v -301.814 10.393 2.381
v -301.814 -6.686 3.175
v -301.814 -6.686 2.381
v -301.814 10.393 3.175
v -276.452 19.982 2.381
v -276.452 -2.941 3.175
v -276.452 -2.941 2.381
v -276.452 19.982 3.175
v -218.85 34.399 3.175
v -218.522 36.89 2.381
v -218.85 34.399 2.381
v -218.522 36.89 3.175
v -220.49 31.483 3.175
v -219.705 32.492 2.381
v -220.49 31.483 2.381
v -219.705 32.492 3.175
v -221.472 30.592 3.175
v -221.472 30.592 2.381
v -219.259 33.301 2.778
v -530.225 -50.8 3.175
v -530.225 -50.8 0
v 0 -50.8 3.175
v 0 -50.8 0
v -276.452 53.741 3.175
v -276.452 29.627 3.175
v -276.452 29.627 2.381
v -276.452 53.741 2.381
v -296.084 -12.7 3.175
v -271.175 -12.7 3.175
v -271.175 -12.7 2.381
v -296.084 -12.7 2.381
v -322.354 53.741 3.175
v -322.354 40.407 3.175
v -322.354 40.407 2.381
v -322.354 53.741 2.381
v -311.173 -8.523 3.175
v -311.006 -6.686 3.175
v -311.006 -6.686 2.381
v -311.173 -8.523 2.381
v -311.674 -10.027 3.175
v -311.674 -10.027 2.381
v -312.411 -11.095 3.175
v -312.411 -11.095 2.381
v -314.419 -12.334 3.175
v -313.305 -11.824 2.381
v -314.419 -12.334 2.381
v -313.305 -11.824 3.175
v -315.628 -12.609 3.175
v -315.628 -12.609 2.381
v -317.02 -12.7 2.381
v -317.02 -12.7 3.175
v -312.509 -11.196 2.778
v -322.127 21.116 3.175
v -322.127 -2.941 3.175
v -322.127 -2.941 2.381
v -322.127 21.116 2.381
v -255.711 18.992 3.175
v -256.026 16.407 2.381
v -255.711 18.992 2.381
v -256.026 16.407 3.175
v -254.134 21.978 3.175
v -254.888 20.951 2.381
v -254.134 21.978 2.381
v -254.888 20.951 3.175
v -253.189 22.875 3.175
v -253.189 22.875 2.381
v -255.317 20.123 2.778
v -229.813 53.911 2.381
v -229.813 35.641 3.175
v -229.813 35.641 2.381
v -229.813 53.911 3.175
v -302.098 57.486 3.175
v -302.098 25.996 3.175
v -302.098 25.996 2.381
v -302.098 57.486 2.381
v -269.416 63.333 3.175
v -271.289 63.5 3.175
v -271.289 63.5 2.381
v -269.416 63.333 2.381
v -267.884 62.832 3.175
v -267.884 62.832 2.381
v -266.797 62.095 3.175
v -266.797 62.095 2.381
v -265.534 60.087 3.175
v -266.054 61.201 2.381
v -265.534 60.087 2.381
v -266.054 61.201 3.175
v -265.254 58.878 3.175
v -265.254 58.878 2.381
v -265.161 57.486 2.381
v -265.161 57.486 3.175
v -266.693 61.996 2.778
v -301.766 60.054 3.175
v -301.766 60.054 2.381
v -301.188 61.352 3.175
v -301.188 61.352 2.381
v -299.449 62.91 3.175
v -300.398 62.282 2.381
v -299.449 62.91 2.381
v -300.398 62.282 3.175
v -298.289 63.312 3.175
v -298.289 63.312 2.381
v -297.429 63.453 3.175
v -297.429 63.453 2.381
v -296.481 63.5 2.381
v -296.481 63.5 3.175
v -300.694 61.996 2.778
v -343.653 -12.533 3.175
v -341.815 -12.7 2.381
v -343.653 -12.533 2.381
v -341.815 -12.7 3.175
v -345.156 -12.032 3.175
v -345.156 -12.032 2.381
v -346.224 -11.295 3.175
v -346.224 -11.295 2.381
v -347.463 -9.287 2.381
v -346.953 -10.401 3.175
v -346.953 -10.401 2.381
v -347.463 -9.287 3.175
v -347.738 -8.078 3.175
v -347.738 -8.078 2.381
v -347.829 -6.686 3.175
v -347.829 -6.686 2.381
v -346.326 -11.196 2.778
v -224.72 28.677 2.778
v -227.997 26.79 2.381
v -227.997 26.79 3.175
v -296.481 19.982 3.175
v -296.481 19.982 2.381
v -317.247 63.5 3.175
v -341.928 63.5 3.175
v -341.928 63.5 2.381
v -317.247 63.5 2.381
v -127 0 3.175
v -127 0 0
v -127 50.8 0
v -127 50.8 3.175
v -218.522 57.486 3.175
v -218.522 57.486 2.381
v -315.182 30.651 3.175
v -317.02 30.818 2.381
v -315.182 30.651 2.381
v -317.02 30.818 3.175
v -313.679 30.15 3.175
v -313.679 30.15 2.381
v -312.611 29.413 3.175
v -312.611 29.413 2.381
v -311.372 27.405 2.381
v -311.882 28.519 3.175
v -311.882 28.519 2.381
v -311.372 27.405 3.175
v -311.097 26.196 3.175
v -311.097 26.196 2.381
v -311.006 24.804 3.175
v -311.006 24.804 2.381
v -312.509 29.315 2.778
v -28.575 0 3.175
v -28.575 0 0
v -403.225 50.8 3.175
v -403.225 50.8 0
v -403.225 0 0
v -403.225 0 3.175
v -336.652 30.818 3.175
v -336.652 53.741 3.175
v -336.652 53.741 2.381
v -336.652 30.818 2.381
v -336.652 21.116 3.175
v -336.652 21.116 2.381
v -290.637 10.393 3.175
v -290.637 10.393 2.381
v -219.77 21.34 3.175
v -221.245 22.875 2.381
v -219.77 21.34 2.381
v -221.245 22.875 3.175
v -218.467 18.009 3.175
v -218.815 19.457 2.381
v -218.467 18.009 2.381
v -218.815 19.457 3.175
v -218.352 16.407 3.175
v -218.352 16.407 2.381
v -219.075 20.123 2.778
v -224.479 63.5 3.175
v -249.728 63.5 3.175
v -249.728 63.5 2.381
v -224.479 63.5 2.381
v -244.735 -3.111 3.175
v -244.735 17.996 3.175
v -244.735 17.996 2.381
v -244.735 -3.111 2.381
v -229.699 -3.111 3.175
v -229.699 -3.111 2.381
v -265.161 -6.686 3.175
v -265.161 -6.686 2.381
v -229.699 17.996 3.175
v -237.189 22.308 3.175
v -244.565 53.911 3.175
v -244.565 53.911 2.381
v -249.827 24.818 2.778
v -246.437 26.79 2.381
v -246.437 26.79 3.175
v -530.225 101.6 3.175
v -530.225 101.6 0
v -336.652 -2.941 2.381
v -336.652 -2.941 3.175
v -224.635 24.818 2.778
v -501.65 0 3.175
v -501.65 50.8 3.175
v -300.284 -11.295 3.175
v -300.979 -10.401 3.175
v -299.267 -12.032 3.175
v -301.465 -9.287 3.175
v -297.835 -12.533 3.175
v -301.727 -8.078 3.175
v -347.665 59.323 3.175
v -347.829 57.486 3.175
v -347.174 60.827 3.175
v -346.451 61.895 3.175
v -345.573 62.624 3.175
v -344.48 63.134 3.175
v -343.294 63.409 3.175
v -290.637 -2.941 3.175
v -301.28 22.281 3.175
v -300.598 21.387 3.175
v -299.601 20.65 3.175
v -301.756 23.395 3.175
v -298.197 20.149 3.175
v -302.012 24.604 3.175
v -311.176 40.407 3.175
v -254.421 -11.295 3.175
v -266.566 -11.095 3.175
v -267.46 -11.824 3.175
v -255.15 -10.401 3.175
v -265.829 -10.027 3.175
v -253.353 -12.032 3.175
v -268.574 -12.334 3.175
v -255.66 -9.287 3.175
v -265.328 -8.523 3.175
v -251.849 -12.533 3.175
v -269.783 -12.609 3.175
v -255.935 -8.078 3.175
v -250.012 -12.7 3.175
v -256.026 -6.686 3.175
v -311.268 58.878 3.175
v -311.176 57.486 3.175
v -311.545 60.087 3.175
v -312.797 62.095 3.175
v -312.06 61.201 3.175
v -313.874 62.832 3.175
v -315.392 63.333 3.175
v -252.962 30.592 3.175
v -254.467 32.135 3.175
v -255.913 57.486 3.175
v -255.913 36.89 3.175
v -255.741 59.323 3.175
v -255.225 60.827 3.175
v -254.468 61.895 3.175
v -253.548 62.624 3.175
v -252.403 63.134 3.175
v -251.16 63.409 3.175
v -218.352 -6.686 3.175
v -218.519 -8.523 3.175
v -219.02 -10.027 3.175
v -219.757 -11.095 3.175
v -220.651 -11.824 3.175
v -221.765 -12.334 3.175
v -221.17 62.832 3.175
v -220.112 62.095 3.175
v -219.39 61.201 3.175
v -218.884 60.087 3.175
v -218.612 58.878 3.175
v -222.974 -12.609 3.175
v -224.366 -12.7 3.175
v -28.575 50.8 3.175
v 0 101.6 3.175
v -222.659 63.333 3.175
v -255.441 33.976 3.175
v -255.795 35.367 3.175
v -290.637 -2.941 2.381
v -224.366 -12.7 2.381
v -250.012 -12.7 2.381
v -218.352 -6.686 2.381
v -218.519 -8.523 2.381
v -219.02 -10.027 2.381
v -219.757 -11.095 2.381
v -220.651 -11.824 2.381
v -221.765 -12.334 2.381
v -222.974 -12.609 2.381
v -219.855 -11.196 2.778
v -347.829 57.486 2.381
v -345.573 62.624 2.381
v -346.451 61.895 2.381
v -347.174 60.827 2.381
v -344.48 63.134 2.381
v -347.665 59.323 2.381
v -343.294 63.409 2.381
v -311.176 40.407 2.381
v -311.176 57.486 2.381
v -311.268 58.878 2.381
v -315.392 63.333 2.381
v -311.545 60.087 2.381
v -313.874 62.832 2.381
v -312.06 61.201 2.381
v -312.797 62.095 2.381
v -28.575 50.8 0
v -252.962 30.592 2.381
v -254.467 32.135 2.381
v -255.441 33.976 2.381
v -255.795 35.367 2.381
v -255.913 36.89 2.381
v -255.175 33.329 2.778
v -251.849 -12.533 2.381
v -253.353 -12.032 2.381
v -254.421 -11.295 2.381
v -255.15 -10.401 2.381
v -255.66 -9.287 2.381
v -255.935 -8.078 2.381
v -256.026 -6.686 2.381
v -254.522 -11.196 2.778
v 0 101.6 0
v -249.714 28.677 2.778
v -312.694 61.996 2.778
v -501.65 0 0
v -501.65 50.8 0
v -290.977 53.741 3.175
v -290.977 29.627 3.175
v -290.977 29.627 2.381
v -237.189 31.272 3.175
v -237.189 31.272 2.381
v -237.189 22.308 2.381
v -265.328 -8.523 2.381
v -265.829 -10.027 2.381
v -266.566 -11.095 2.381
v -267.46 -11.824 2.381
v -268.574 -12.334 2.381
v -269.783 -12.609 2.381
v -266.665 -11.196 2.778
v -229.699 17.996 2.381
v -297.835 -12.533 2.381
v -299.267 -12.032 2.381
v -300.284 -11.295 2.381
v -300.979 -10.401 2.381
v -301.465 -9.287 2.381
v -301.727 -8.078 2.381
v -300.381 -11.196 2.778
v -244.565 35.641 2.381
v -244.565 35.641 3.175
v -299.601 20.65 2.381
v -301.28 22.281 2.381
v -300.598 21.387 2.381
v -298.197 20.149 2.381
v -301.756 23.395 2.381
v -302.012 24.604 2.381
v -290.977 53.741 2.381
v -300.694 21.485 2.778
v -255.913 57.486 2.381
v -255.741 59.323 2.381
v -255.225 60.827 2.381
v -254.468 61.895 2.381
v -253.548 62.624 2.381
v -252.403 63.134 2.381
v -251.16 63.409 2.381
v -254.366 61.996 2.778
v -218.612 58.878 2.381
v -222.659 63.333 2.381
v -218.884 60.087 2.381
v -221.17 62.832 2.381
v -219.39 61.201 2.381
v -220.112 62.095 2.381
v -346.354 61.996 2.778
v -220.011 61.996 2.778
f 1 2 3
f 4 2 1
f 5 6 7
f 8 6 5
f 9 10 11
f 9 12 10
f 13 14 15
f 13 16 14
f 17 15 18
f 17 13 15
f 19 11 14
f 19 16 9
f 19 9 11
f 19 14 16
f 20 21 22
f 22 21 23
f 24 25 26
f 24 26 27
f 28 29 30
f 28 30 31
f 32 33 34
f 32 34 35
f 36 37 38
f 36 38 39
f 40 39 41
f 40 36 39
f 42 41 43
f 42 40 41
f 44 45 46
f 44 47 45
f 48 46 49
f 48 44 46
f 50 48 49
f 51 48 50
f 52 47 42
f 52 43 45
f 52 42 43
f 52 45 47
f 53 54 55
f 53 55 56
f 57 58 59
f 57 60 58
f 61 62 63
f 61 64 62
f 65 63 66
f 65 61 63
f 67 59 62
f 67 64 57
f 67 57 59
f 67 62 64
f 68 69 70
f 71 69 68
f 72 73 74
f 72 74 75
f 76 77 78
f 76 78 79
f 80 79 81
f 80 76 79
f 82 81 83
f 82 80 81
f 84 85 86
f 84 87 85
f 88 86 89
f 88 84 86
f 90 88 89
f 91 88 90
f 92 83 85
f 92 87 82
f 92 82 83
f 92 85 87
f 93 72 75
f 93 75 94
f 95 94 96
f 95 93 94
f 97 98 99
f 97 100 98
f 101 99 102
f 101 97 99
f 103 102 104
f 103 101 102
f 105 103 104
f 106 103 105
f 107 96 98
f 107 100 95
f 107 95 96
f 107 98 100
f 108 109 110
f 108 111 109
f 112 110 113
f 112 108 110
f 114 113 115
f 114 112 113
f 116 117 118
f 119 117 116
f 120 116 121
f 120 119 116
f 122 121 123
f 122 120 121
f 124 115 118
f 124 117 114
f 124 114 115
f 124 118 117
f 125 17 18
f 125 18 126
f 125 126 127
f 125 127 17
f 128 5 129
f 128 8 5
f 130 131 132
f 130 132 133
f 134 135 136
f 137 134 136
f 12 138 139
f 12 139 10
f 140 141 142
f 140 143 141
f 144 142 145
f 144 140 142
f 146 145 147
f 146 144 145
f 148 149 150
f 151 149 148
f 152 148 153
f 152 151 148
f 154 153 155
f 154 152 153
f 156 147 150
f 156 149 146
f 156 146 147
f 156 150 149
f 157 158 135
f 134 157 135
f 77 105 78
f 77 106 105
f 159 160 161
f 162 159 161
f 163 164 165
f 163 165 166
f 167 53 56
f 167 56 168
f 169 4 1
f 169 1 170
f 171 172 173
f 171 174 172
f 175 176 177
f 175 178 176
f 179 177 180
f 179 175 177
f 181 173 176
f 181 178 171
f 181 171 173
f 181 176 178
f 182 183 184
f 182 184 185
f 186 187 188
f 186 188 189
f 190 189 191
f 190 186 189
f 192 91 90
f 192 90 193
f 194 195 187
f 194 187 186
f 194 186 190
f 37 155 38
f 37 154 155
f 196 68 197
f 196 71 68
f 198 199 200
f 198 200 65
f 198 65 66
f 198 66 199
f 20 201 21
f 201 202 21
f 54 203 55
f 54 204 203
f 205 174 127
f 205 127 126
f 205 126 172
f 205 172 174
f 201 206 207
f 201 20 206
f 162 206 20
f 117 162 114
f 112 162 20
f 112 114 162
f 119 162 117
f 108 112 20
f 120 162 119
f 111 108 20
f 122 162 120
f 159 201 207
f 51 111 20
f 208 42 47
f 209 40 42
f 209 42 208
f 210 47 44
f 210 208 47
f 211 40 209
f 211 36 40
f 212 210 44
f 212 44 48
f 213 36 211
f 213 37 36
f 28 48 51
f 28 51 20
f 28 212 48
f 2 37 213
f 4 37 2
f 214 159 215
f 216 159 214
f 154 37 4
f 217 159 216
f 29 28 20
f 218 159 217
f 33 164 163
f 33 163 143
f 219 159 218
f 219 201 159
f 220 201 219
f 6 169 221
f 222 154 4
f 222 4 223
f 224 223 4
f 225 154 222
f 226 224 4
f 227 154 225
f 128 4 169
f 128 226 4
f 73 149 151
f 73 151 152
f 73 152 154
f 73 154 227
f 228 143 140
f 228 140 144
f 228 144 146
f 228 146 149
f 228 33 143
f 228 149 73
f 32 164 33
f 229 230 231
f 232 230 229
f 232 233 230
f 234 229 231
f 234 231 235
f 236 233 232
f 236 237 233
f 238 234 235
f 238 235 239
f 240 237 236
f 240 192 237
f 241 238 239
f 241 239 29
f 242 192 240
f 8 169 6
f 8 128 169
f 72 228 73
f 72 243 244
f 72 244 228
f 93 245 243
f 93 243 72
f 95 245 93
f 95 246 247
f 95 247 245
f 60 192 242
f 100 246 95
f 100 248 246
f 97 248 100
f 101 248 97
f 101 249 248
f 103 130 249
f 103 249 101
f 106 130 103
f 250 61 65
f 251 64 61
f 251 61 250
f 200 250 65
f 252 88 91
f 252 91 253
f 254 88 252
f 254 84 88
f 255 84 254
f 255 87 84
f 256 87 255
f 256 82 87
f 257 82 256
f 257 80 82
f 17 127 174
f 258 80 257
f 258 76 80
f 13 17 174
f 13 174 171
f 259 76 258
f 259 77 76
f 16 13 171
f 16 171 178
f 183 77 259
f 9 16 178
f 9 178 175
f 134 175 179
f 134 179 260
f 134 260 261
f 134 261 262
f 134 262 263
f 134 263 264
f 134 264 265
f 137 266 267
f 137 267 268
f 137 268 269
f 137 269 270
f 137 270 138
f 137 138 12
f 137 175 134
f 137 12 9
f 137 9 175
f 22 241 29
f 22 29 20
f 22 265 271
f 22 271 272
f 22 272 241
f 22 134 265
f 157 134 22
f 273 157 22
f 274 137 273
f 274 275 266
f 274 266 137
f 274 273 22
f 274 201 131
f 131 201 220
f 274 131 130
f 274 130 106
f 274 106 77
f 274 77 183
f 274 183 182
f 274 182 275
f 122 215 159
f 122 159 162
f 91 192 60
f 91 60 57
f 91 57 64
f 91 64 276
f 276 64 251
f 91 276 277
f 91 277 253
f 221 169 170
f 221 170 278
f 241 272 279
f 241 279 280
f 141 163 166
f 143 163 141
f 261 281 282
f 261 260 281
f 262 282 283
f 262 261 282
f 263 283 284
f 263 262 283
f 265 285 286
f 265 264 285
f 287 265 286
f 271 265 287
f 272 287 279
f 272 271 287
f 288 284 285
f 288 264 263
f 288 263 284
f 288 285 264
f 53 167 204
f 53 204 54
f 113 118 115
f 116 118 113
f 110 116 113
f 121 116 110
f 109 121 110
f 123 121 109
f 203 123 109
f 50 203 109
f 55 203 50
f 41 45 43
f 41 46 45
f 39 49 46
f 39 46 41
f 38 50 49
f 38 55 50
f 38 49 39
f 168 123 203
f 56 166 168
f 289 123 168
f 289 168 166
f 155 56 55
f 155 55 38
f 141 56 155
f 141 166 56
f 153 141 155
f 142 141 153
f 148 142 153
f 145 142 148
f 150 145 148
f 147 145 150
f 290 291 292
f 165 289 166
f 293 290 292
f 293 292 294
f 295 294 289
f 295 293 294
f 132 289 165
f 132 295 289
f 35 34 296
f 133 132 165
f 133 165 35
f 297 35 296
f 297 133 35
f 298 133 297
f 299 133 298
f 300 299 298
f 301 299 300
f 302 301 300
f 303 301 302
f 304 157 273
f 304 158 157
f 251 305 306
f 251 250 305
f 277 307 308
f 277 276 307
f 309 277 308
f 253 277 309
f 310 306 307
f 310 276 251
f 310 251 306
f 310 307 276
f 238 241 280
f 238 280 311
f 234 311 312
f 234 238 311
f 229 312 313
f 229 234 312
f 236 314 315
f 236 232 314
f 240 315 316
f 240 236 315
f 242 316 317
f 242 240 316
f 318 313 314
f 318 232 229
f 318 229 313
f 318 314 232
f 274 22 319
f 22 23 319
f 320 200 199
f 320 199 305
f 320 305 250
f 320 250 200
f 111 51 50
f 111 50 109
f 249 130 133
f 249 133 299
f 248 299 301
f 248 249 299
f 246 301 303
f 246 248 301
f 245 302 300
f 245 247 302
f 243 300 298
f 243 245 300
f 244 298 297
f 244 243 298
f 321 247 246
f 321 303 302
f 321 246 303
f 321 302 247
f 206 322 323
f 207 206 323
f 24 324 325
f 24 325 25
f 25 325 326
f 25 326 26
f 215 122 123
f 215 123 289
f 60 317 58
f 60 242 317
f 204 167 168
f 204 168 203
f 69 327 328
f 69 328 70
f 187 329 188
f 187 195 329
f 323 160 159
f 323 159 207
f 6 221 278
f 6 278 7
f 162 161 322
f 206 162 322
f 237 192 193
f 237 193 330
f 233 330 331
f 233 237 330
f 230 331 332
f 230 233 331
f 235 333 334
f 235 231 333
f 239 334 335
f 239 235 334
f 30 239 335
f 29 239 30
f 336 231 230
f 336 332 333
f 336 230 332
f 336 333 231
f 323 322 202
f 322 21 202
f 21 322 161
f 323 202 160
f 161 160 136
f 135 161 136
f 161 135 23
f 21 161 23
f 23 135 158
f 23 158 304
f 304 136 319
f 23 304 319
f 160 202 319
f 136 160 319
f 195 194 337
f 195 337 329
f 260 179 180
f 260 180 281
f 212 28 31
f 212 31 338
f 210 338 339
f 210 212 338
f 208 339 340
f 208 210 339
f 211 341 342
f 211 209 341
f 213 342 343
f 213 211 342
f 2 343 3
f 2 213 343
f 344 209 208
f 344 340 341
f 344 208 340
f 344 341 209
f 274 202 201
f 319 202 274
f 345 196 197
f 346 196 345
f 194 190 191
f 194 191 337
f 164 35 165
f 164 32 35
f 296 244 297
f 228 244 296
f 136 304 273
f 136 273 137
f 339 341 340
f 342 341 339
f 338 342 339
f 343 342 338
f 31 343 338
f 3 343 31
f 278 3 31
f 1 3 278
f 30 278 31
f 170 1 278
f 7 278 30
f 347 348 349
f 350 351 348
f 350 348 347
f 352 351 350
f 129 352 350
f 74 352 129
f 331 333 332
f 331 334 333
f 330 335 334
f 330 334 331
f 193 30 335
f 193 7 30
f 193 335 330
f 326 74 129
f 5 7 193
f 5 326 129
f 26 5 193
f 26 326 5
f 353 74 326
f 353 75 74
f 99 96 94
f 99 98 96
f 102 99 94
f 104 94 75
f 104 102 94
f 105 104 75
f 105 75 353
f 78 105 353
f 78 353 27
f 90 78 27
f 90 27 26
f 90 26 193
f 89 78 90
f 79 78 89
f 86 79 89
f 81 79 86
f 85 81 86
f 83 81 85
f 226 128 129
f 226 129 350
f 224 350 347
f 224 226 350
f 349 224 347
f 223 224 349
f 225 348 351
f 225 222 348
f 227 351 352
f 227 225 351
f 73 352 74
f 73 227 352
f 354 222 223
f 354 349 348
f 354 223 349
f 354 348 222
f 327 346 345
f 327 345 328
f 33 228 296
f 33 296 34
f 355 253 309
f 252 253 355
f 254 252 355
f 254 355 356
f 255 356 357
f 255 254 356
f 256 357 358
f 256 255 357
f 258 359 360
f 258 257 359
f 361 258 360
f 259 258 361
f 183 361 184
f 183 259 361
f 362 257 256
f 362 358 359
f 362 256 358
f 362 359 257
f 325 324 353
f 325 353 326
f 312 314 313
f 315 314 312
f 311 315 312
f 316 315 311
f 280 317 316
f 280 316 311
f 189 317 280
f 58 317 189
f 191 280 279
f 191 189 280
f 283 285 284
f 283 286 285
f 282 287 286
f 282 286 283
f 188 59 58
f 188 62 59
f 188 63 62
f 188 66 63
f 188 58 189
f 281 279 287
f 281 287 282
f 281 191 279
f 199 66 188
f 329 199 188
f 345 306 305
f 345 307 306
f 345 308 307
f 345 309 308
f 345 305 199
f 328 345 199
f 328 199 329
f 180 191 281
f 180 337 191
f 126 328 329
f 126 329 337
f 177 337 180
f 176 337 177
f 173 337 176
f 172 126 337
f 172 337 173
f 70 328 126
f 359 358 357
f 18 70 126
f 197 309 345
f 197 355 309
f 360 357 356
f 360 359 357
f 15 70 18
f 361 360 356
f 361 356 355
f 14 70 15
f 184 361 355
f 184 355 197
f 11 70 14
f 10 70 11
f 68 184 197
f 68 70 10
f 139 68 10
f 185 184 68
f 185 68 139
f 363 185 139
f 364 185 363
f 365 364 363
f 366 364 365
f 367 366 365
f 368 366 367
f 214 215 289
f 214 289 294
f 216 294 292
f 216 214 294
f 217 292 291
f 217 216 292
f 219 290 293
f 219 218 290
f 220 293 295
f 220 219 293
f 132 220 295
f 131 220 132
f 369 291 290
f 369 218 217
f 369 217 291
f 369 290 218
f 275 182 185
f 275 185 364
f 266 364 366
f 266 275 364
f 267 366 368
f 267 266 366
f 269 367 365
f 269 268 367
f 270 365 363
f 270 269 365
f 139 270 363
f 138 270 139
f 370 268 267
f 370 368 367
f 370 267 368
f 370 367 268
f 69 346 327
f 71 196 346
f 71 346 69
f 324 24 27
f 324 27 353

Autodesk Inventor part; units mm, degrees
ref_plane "YZ Plane" through (0, 0, 0) normal (1, 0, 0) x (0, 1, 0)
ref_plane "XZ Plane" through (0, 0, 0) normal (0, 1, 0) x (-1, 0, 0)
ref_plane "XY Plane" through (0, 0, 0) normal (0, 0, 1) x (1, 0, 0)
sketch "Sketch1" plane through (0, 0, 0) normal (0, 0, 1) x (1, 0, 0)
  line L0 (0, 0) -> (-530.225, 0)
  line L1 (-530.225, 0) -> (-530.225, -50.8)
  line L2 (-530.225, -50.8) -> (0, -50.8)
  line L3 (0, -50.8) -> (0, 0)
  line L4 (-403.225, 0) -> (-127, 0)
  line L5 (-127, 0) -> (-127, 50.8)
  line L6 (-127, 50.8) -> (-403.225, 50.8)
  line L7 (-403.225, 50.8) -> (-403.225, 0)
  line L8 (0, 50.8) -> (-530.225, 50.8)
  line L9 (-530.225, 50.8) -> (-530.225, 101.6)
  line L10 (-530.225, 101.6) -> (0, 101.6)
  line L11 (0, 101.6) -> (0, 50.8)
  line L12 (-530.225, 0) -> (-501.65, 0)
  line L13 (-501.65, 0) -> (-501.65, 50.8)
  line L14 (-501.65, 50.8) -> (-530.225, 50.8)
  line L15 (-530.225, 50.8) -> (-530.225, 0)
  line L16 (0, 0) -> (-28.575, 0)
  line L17 (-28.575, 0) -> (-28.575, 50.8)
  line L18 (-28.575, 50.8) -> (0, 50.8)
  line L19 (0, 50.8) -> (0, 0)
  dimension "d0" = 530.225
  dimension "d1" = 50.8
  dimension "d2" = 50.8
  dimension "d3" = 127
  dimension "d4" = 127
  dimension "d5" = 50.8
  dimension "d6" = 530.225
  dimension "d7" = 0
  dimension "d8" = 50.8
  dimension "d9" = 28.575
  dimension "d10" = 28.575
extrude "Extrusion1" add sketch "Sketch1" along normal blind 3.175 contours L3 L2 L1 L0 | L0 L17 L8 L19 | L8 L6 L9 L10 L11 | L0 L7 L6 L5 | L15 L8 L13 L0
sketch "Sketch2" plane through (0, 0, 3.175) normal (0, 0, 1) x (1, 0, 0)
  line L0 (-352.425, 63.5) -> (-177.8, 63.5) construction
  line L1 (-177.8, 63.5) -> (-177.8, -1.2974) construction
  line L2 (-177.8, -1.2974) -> (-352.425, -1.2974) construction
  line L3 (-352.425, -1.2974) -> (-352.425, 63.5) construction
  line L4 (-403.225, 50.8) -> (-403.225, 0) projected
  line L5 (-127, 0) -> (-127, 50.8) projected
  line L6 (0, 101.6) -> (-530.225, 101.6) projected
  spline S0 degree 2 poles (-311.0058, -6.6857) (-311.0058, -12.7) (-317.0201, -12.7) knots 0 0 0 1 1 1
  line L7 (-317.0201, -12.7) -> (-341.8149, -12.7)
  spline S1 degree 2 poles (-341.8149, -12.7) (-347.8292, -12.7) (-347.8292, -6.6857) knots 0 0 0 1 1 1
  line L8 (-347.8292, -6.6857) -> (-347.8292, 57.4857)
  spline S2 degree 2 poles (-347.8292, 57.4857) (-347.8292, 63.5) (-341.9284, 63.5) knots 0 0 0 1 1 1
  line L9 (-341.9284, 63.5) -> (-317.247, 63.5)
  spline S3 degree 2 poles (-317.247, 63.5) (-311.176, 63.5) (-311.176, 57.4857) knots 0 0 0 1 1 1
  line L10 (-311.176, 57.4857) -> (-311.176, 40.4074)
  line L11 (-311.176, 40.4074) -> (-322.3535, 40.4074)
  line L12 (-322.3535, 40.4074) -> (-322.3535, 53.741)
  line L13 (-322.3535, 53.741) -> (-336.6517, 53.741)
  line L14 (-336.6517, 53.741) -> (-336.6517, 30.8185)
  line L15 (-336.6517, 30.8185) -> (-317.0201, 30.8185)
  spline S4 degree 2 poles (-317.0201, 30.8185) (-311.0058, 30.8185) (-311.0058, 24.8042) knots 0 0 0 1 1 1
  line L16 (-311.0058, 24.8042) -> (-311.0058, -6.6857)
  line L17 (-322.1266, -2.941) -> (-322.1266, 21.1162)
  line L18 (-322.1266, 21.1162) -> (-336.6517, 21.1162)
  line L19 (-336.6517, 21.1162) -> (-336.6517, -2.941)
  line L20 (-336.6517, -2.941) -> (-322.1266, -2.941)
  spline S5 degree 2 poles (-265.161, -6.6857) (-265.161, -12.7) (-271.1753, -12.7) knots 0 0 0 1 1 1
  line L21 (-271.1753, -12.7) -> (-296.0835, -12.7)
  spline S6 degree 2 poles (-296.0835, -12.7) (-301.8141, -12.7) (-301.8141, -6.6857) knots 0 0 0 1 1 1
  line L22 (-301.8141, -6.6857) -> (-301.8141, 10.3926)
  line L23 (-301.8141, 10.3926) -> (-290.6366, 10.3926)
  line L24 (-290.6366, 10.3926) -> (-290.6366, -2.941)
  line L25 (-290.6366, -2.941) -> (-276.452, -2.941)
  line L26 (-276.452, -2.941) -> (-276.452, 19.9815)
  line L27 (-276.452, 19.9815) -> (-296.4807, 19.9815)
  spline S7 degree 2 poles (-296.4807, 19.9815) (-302.0978, 19.9815) (-302.0978, 25.9958) knots 0 0 0 1 1 1
  line L28 (-302.0978, 25.9958) -> (-302.0978, 57.4857)
  spline S8 degree 2 poles (-302.0978, 57.4857) (-302.0978, 63.5) (-296.4807, 63.5) knots 0 0 0 1 1 1
  line L29 (-296.4807, 63.5) -> (-271.2887, 63.5)
  spline S9 degree 2 poles (-271.2887, 63.5) (-265.161, 63.5) (-265.161, 57.4857) knots 0 0 0 1 1 1
  line L30 (-265.161, 57.4857) -> (-265.161, -6.6857)
  line L31 (-276.452, 29.627) -> (-276.452, 53.741)
  line L32 (-276.452, 53.741) -> (-290.977, 53.741)
  line L33 (-290.977, 53.741) -> (-290.977, 29.627)
  line L34 (-290.977, 29.627) -> (-276.452, 29.627)
  spline S10 degree 2 poles (-218.3516, -6.6857) (-218.3516, -12.7) (-224.3659, -12.7) knots 0 0 0 1 1 1
  line L35 (-224.3659, -12.7) -> (-250.0117, -12.7)
  spline S11 degree 2 poles (-250.0117, -12.7) (-256.026, -12.7) (-256.026, -6.6857) knots 0 0 0 1 1 1
  line L36 (-256.026, -6.6857) -> (-256.026, 16.4069)
  spline S12 degree 2 poles (-256.026, 16.4069) (-256.026, 20.6056) (-253.1891, 22.8751) knots 0 0 0 1 1 1
  spline S13 degree 2 poles (-253.1891, 22.8751) (-249.8415, 24.8042) (-246.4372, 26.7901) knots 0 0 0 1 1 1
  spline S14 degree 2 poles (-246.4372, 26.7901) (-249.7281, 28.6625) (-252.9622, 30.5916) knots 0 0 0 1 1 1
  spline S15 degree 2 poles (-252.9622, 30.5916) (-255.9126, 32.9179) (-255.9126, 36.8896) knots 0 0 0 1 1 1
  line L37 (-255.9126, 36.8896) -> (-255.9126, 57.4857)
  spline S16 degree 2 poles (-255.9126, 57.4857) (-255.9126, 63.5) (-249.7281, 63.5) knots 0 0 0 1 1 1
  line L38 (-249.7281, 63.5) -> (-224.4794, 63.5)
  spline S17 degree 2 poles (-224.4794, 63.5) (-218.5218, 63.5) (-218.5218, 57.4857) knots 0 0 0 1 1 1
  line L39 (-218.5218, 57.4857) -> (-218.5218, 36.8896)
  spline S18 degree 2 poles (-218.5218, 36.8896) (-218.5218, 32.8611) (-221.4722, 30.5916) knots 0 0 0 1 1 1
  spline S19 degree 2 poles (-221.4722, 30.5916) (-224.7063, 28.6625) (-227.9972, 26.7901) knots 0 0 0 1 1 1
  spline S20 degree 2 poles (-227.9972, 26.7901) (-224.6496, 24.8042) (-221.2453, 22.8751) knots 0 0 0 1 1 1
  spline S21 degree 2 poles (-221.2453, 22.8751) (-218.3516, 20.6056) (-218.3516, 16.4069) knots 0 0 0 1 1 1
  line L40 (-218.3516, 16.4069) -> (-218.3516, -6.6857)
  line L41 (-229.6993, -3.1112) -> (-229.6993, 17.9956)
  line L42 (-229.6993, 17.9956) -> (-237.1888, 22.3077)
  line L43 (-237.1888, 22.3077) -> (-244.7351, 17.9956)
  line L44 (-244.7351, 17.9956) -> (-244.7351, -3.1112)
  line L45 (-244.7351, -3.1112) -> (-229.6993, -3.1112)
  line L46 (-229.8128, 35.6413) -> (-229.8128, 53.9112)
  line L47 (-229.8128, 53.9112) -> (-244.5648, 53.9112)
  line L48 (-244.5648, 53.9112) -> (-244.5648, 35.6413)
  line L49 (-244.5648, 35.6413) -> (-237.1888, 31.2725)
  line L50 (-237.1888, 31.2725) -> (-229.8128, 35.6413)
  point P0 (0, 0)
  dimension "d13" = 50.8
  dimension "d14" = 50.8
  dimension "d15" = 38.1
extrude "Extrusion2" cut sketch "Sketch2" against normal blind 0.7937
sketch "Sketch3" plane through (0, 0, 3.175) normal (0, 0, 1) x (1, 0, 0)
  point P0 (0, 0)
properties part number "upper Ramp"
